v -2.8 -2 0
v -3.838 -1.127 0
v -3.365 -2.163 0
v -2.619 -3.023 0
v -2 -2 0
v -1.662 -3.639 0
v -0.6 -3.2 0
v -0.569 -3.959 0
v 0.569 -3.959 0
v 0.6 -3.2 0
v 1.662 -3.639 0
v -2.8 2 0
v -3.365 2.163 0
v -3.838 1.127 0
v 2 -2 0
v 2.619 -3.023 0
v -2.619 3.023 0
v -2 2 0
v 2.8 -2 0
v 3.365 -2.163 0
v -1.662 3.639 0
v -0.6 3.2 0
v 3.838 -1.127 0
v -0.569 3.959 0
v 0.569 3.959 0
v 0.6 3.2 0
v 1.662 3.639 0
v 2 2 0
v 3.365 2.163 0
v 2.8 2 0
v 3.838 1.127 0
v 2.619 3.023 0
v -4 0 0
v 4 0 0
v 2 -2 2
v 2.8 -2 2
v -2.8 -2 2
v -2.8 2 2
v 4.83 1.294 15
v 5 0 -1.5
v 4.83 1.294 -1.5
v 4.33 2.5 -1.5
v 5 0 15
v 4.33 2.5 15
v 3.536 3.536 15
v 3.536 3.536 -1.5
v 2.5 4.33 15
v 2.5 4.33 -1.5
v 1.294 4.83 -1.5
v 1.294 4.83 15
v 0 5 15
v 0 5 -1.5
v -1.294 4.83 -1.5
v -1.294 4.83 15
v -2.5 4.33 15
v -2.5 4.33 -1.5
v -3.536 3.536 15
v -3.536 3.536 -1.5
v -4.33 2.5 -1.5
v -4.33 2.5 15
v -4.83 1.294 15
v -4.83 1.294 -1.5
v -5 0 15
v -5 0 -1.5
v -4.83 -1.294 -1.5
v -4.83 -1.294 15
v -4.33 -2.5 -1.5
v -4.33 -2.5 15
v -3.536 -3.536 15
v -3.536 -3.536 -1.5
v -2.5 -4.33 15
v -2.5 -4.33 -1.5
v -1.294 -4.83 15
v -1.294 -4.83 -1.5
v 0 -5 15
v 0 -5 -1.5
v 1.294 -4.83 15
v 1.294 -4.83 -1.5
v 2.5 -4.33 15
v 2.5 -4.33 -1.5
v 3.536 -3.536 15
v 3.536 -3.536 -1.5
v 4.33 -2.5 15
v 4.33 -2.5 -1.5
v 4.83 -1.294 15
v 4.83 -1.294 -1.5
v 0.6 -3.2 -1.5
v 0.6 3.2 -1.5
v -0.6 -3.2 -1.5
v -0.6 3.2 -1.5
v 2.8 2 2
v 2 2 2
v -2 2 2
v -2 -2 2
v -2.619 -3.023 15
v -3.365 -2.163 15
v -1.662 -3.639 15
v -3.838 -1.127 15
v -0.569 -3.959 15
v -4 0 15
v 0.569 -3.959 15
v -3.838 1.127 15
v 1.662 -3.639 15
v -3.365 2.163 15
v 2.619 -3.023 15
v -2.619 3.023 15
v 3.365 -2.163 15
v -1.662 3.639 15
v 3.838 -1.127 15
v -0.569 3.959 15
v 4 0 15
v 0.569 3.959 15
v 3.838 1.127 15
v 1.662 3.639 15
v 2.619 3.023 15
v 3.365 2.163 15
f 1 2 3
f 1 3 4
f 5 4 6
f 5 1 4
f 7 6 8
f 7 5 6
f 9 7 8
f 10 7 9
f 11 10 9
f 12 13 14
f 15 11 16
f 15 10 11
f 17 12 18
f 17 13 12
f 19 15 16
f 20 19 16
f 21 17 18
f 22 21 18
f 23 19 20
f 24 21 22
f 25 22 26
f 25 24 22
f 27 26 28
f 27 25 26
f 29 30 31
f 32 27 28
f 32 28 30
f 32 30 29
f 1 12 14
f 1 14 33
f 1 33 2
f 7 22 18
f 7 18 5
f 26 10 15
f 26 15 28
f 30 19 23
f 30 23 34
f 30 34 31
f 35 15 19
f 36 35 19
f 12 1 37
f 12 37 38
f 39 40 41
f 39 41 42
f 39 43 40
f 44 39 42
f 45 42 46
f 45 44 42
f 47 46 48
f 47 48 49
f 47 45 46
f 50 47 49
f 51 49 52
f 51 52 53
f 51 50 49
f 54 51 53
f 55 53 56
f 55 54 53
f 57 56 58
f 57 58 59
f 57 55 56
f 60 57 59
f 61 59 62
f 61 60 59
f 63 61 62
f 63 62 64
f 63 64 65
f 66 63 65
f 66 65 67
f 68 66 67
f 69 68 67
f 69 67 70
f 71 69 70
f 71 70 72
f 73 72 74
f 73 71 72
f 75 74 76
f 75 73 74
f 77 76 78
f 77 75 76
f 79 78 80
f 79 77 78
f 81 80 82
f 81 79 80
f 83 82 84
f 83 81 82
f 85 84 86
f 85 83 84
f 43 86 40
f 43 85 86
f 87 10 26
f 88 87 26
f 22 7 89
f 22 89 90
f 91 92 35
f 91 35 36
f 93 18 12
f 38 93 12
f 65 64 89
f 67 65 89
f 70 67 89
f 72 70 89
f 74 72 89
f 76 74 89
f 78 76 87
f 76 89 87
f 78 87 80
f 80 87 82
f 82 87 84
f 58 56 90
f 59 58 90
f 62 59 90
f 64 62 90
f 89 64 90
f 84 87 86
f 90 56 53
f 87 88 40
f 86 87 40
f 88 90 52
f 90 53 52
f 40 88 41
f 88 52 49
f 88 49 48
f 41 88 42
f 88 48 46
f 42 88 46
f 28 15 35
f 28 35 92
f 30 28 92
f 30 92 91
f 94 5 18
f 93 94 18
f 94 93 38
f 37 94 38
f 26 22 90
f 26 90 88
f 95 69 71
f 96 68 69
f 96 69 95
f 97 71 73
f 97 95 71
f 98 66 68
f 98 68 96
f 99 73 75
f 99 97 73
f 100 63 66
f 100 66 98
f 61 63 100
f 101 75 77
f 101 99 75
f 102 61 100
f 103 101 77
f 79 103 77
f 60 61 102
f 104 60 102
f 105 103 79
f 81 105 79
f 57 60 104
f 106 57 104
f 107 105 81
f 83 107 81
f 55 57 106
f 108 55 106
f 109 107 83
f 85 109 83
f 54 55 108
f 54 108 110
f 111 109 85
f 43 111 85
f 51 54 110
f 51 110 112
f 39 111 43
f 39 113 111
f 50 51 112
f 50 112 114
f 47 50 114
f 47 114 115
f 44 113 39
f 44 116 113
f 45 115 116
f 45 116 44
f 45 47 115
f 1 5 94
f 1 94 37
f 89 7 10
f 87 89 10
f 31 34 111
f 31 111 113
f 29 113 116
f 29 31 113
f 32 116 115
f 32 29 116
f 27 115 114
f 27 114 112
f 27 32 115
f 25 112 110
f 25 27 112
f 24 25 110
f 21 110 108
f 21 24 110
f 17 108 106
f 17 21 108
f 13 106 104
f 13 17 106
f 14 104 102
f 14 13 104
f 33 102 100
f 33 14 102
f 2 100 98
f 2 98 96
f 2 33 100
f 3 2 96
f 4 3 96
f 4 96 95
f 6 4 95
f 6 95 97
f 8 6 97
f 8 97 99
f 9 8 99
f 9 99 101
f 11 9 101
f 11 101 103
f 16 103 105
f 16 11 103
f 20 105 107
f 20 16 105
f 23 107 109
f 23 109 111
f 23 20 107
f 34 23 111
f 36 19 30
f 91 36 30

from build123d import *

# Parameters (mm, degrees)
F0_R     = 5
F0_R_2   = 4
F1_DEPTH = 15
F2_R     = 5
F3_DEPTH = 1.5
F4_W     = 1.2
F4_H     = 6.4
F5_DEPTH = 2
F6_W     = 0.8
F6_H     = 4
F7_DEPTH = 2


# Not quite as in the source:
# - a pattern or mirror of a feature is missing from the dataset's text; its kind, count and spacing are read off the source's solid


with BuildPart() as f1:
    # F0 (on Top) → F1 (new body)
    with BuildSketch(Plane.XY):
        Circle(F0_R)
        Circle(F0_R_2, mode=Mode.SUBTRACT)
    extrude(amount=F1_DEPTH)

    # F2 (on Top) → F3 (join)
    with BuildSketch(Plane.XY):
        Circle(F2_R)
    extrude(amount=-F3_DEPTH)

    # F4 (on Top) → F5 (cut)
    with BuildSketch(Plane.XY):
        Rectangle(F4_W, F4_H)
    extrude(amount=-F5_DEPTH, mode=Mode.SUBTRACT)

    # F6 (on Top) → F7 (join)
    with BuildSketch(Plane.XY):
        with Locations((2.4, 0)):
            Rectangle(F6_W, F6_H)
    f7 = extrude(amount=F7_DEPTH)

    # F7_copies: F7 across plane
    add(f7.mirror(Plane(origin=(0, 0, 0), x_dir=(0, 0, -1), z_dir=(-1, 0, 0))))


solid = f1.part
